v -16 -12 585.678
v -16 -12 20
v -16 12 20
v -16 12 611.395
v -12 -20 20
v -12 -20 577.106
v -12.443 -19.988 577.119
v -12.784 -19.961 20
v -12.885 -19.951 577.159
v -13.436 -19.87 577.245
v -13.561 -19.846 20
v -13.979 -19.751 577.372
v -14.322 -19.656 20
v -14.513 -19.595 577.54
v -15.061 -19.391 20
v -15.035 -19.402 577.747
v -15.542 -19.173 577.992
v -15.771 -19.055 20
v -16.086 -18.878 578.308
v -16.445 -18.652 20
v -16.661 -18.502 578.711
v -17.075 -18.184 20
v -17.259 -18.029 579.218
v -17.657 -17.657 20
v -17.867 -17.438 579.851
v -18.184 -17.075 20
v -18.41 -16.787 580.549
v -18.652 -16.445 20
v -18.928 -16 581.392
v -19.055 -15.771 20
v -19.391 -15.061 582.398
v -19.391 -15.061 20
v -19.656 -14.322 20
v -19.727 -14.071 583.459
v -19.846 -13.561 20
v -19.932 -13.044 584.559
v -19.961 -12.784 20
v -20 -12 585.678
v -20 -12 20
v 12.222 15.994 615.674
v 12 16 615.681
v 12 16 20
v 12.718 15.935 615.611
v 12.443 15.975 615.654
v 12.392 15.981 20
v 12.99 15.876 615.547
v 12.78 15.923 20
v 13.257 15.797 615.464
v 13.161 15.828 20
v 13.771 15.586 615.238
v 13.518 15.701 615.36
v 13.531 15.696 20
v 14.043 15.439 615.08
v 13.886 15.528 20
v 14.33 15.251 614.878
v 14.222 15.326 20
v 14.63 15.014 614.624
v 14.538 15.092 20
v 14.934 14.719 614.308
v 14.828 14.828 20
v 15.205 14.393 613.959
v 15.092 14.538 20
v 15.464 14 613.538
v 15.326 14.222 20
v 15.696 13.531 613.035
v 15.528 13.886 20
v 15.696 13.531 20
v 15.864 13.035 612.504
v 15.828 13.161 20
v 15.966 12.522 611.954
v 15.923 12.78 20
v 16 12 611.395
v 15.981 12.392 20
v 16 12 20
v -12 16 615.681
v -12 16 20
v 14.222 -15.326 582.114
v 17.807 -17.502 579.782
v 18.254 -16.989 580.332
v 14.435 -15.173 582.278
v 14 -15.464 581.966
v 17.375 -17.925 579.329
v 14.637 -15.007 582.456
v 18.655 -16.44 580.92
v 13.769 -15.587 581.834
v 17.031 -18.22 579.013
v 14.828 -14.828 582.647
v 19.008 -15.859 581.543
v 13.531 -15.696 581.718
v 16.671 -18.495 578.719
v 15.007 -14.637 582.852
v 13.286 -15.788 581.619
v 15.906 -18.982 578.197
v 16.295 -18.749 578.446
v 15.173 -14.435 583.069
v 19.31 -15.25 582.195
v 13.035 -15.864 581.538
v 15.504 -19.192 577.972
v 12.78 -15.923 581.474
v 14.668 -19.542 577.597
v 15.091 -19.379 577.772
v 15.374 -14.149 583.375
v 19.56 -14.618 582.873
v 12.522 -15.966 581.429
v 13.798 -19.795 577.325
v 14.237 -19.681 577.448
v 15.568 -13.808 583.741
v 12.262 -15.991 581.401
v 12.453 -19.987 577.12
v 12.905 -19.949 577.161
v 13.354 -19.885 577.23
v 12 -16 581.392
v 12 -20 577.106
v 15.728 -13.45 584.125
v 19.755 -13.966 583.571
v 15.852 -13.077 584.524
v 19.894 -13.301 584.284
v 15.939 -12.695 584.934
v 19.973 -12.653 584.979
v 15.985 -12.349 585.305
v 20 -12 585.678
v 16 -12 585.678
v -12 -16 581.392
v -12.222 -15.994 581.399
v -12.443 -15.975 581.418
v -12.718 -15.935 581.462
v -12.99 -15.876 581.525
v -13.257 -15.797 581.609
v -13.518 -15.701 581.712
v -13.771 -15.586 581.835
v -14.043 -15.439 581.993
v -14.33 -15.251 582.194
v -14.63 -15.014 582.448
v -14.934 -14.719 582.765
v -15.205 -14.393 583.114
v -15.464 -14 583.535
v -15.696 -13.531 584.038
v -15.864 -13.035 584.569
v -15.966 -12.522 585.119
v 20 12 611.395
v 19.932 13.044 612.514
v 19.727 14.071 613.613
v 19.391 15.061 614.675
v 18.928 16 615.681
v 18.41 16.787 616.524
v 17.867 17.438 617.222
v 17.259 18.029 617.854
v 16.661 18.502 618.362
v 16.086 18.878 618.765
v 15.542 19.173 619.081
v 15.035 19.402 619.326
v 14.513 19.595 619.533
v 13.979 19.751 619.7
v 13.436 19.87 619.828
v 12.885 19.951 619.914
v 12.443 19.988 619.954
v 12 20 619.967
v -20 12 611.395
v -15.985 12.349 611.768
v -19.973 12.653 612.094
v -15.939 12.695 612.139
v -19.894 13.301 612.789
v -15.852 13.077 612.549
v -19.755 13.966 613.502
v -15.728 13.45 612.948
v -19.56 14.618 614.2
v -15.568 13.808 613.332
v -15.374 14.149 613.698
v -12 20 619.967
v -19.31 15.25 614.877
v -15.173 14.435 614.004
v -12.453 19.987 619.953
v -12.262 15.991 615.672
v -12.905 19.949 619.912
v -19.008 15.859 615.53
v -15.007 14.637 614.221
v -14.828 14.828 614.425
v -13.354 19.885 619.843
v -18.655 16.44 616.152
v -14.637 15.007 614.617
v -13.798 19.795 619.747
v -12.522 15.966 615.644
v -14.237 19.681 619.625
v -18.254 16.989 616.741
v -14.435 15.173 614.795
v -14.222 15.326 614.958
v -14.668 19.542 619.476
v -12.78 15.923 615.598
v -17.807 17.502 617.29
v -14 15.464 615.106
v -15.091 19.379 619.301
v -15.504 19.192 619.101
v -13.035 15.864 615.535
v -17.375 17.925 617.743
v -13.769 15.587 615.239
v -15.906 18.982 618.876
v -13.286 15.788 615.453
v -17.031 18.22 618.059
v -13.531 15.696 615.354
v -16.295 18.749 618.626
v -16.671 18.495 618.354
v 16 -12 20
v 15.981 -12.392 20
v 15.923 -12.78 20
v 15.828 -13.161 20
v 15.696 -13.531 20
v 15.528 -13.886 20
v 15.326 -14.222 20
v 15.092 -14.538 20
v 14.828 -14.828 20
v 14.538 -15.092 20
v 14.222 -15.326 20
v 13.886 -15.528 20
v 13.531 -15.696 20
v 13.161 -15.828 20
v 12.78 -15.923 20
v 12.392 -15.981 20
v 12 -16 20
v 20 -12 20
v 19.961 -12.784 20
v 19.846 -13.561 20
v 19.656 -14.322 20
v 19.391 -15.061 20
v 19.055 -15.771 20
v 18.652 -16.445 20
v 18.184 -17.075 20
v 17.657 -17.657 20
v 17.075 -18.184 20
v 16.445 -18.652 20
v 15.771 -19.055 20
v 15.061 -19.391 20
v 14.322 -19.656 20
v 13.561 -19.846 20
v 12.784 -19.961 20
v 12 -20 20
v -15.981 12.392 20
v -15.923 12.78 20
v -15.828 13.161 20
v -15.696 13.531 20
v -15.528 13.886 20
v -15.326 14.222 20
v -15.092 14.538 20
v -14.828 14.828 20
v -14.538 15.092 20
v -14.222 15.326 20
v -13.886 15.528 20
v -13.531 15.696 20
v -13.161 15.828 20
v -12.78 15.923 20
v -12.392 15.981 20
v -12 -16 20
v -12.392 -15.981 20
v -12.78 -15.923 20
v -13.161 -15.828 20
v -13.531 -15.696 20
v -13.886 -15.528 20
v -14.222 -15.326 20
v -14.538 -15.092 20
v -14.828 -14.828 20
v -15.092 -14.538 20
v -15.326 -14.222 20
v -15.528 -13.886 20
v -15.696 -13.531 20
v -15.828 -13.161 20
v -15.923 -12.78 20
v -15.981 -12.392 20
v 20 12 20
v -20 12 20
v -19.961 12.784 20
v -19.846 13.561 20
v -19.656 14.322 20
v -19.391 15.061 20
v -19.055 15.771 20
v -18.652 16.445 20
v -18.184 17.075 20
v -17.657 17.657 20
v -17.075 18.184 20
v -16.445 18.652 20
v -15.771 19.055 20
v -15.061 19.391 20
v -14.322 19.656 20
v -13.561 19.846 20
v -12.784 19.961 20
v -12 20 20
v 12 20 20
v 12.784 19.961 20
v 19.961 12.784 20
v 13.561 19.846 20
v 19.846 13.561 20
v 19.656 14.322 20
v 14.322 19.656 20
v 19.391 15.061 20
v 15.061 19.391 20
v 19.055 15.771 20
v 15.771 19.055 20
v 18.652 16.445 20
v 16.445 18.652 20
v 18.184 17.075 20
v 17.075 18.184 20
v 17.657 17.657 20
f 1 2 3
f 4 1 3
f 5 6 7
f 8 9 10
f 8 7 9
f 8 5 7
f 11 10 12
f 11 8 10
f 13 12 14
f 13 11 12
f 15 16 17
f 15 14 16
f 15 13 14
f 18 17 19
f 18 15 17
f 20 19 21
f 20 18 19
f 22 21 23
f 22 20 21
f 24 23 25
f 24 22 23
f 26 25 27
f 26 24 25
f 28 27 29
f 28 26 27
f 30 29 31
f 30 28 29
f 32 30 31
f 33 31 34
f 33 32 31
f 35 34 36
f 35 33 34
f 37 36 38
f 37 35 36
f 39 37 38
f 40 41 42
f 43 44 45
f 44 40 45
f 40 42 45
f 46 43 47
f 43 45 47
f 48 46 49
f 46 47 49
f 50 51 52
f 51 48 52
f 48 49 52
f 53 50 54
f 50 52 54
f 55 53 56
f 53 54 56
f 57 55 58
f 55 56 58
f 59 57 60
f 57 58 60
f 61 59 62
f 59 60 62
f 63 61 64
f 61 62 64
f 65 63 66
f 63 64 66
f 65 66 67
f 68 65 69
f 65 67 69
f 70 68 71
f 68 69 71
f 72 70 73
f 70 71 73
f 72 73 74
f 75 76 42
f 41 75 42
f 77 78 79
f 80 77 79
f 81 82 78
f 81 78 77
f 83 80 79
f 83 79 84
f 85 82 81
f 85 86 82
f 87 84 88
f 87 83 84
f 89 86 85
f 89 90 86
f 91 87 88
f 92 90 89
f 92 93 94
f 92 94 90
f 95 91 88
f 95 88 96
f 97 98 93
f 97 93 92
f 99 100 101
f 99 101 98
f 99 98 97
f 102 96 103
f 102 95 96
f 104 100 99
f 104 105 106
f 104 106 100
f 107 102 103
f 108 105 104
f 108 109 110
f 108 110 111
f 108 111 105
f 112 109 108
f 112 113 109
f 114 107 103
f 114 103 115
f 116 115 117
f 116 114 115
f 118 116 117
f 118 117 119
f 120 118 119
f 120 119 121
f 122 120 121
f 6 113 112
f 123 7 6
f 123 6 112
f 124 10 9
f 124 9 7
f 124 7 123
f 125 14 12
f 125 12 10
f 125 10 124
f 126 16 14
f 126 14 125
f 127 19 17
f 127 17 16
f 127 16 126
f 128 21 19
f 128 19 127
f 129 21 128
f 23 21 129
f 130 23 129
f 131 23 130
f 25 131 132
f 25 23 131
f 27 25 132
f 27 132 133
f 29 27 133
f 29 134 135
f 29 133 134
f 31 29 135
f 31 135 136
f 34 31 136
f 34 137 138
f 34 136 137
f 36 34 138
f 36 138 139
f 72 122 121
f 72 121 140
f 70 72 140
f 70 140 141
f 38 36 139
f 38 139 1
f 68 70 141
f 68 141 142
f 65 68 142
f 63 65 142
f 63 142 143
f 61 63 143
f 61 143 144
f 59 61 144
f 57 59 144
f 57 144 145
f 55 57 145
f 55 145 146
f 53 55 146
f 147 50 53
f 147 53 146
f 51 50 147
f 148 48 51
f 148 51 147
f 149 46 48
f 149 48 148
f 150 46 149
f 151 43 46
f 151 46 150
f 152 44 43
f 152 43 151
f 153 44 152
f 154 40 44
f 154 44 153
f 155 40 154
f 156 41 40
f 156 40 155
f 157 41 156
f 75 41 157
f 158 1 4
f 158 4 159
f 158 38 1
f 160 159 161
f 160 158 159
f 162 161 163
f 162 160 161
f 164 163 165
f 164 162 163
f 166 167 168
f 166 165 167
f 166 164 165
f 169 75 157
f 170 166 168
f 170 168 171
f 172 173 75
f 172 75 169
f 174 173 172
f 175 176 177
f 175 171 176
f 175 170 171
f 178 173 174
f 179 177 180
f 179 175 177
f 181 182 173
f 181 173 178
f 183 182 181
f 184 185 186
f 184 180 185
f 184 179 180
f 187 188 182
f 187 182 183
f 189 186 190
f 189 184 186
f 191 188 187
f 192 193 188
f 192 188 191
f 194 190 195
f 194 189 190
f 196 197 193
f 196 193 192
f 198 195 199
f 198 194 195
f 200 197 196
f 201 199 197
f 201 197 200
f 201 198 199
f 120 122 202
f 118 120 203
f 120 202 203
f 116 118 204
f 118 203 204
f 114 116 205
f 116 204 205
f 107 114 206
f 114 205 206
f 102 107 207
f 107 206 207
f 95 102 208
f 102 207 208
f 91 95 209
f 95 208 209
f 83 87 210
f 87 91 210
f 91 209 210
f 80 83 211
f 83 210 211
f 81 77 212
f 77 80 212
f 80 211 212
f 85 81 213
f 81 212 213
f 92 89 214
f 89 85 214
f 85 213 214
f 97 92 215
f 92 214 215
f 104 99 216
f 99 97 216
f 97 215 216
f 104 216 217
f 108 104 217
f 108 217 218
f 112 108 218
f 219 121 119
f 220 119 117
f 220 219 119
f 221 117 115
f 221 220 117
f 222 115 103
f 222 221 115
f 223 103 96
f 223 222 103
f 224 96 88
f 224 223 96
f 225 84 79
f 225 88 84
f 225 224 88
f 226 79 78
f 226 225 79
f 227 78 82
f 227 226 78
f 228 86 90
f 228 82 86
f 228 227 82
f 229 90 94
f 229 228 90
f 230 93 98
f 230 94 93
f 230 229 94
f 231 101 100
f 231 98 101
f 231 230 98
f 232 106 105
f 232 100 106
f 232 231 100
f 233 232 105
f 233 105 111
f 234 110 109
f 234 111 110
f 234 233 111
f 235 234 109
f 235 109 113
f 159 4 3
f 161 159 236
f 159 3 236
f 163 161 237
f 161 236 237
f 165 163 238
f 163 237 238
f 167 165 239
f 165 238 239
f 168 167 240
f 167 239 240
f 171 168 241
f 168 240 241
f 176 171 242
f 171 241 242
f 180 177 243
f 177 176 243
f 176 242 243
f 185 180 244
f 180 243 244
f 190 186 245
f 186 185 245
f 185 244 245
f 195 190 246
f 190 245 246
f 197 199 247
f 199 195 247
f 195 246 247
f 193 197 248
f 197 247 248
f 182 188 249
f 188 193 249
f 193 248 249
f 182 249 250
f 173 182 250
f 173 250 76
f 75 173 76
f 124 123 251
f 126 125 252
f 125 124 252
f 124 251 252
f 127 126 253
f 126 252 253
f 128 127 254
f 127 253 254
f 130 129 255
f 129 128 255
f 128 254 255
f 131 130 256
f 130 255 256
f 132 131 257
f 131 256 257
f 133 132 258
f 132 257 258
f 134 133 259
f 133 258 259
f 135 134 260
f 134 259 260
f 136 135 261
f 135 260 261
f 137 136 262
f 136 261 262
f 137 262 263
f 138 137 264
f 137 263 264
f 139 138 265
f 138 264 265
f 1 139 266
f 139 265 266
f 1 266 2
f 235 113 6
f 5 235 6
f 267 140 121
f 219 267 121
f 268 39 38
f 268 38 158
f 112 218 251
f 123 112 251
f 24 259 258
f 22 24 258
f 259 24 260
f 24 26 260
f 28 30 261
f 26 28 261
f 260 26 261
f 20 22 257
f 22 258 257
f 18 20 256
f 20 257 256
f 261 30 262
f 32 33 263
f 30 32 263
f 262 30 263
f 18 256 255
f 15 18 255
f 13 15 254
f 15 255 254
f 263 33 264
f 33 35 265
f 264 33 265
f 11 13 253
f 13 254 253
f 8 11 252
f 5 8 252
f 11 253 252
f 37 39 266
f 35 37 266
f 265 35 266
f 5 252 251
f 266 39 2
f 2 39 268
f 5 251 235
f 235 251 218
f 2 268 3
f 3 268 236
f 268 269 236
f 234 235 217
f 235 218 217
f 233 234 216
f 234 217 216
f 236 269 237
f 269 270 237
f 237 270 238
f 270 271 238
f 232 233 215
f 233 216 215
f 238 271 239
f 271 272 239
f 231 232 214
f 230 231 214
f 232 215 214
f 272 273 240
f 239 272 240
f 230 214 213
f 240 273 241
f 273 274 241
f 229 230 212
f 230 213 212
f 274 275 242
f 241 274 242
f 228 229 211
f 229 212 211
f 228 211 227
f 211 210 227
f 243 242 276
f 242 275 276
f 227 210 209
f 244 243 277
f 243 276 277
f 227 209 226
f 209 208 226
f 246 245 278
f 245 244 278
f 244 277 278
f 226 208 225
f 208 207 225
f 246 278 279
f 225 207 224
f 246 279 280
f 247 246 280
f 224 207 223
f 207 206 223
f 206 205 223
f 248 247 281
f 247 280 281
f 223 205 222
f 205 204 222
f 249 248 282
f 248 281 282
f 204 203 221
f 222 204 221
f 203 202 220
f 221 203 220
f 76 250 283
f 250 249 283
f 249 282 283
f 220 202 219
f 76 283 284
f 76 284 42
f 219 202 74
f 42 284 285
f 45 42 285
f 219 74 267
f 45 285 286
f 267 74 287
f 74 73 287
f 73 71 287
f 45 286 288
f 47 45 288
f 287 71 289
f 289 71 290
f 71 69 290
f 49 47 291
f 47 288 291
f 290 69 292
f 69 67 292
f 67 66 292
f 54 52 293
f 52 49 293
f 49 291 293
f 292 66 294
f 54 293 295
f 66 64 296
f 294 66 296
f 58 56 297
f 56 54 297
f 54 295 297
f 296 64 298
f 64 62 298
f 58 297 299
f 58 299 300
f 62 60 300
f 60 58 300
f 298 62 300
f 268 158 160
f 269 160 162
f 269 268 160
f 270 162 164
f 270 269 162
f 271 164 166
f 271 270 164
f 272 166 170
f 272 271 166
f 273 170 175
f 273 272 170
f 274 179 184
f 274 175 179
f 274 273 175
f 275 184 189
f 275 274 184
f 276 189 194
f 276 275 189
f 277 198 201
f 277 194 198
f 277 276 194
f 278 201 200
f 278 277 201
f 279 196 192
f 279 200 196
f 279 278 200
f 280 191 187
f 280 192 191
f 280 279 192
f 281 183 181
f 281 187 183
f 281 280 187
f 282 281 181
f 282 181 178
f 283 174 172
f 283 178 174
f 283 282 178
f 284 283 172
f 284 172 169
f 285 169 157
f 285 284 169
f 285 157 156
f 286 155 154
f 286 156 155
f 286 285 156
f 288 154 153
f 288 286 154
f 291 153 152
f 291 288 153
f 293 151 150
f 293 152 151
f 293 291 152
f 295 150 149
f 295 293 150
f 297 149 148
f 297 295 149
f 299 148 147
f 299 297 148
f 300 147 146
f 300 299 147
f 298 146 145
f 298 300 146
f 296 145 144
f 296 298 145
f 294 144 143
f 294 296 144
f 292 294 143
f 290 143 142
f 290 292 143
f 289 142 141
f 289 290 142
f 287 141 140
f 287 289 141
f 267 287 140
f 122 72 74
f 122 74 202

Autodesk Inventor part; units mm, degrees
ref_plane "Start Plane" through (0, 0, 20) normal (0, 0, 1) x (1, 0, 0)
ref_plane "End Plane" through (0, 0, 619.9668) normal (0, 0, 1) x (1, 0, 0)
sketch "Sketch" plane through (0, 0, 0) normal (0, 0, 1) x (1, 0, 0)
  line L0 (-20, -12) -> (-20, 12)
  line L1 (-12, 20) -> (12, 20)
  line L2 (20, 12) -> (20, -12)
  line L3 (12, -20) -> (-12, -20)
  arc A0 (-20, -12) -> (-12, -20) centre (-12, -12) ccw
  arc A1 (20, 12) -> (12, 20) centre (12, 12) ccw
  arc A2 (-12, 20) -> (-20, 12) centre (-12, 12) ccw
  arc A3 (12, -20) -> (20, -12) centre (12, -12) ccw
  arc A4 (-12, 16) -> (-16, 12) centre (-12, 12) ccw
  line L4 (-12, 16) -> (12, 16)
  arc A5 (16, 12) -> (12, 16) centre (12, 12) ccw
  line L5 (16, 12) -> (16, -12)
  arc A6 (12, -16) -> (16, -12) centre (12, -12) ccw
  line L6 (12, -16) -> (-12, -16)
  arc A7 (-16, -12) -> (-12, -16) centre (-12, -12) ccw
  line L7 (-16, -12) -> (-16, 12)
  line L8 (0, 30.3196) -> (0, -30.3196) construction
  line L9 (-30.3196, 0) -> (30.3196, 0) construction
  dimension "d7" = 8
  dimension "d9" = 40
  dimension "d11" = 40
  dimension "d12" = 4
  dimension "d15" = 20
  dimension "d16" = 20
extrude "Body" add sketch "Sketch" along normal up to surface (599.9668 mm away) from surface at 20
sketch "Sketch3" plane through (0, 0, 0) normal (0, 0, 1) x (1, 0, 0)
  line L0 (0, 0) -> (10, 0)
ref_plane "Work Plane3" through (0, 0, 0) normal (0, -1, 0) x (1, 0, 0)
ref_plane "Work Plane4" through (0, 20.7311, 620.7502) normal (0, -0.7311, 0.6823) x (1, 0, 0)
split "Split1" plane through (0, 20.7311, 620.7502) removes the side toward (0, -0.7311, 0.6823)
ref_plane "Work Plane5" through (-12, 0, 20) normal (0, 0, -1) x (-1, 0, 0)
split "Split2" plane through (-12, 0, 20) removes the side toward (0, 0, -1)
sketch "Sketch4" plane through (0, 0, 0) normal (0, -1, 0) x (1, 0, 0)
  line L0 (-2, 20) -> (12, 20) projected
  line L1 (-2, 619.9668) -> (12, 619.9668) projected
  dimension "d18" = 599.9668
equation "\"d7\" = G_IR"
equation "\"d9\" = G_W"
equation "\"d11\" = G_H"
equation "\"d12\" = G_T"
equation "\"d15\" = 0.5 * d9"
equation "\"d16\" = 0.5 * d11"
equation "\"d3\" = G_L"
equation "\"G_W\" = 40"
equation "\"G_H\" = 40"
equation "\"G_T\" = 4"
equation "\"G_IR\" = 8"
equation "\"G_L\" = d18"
equation "\"G_OFFSET_END\" = 19.96675"
equation "\"d14\" = G_OFFSET_END + B_L"
equation "\"B_L\" = 600"
properties part number "ISO 10799-2 - 40x40x4 - 599,97" material "Steel, Mild"
